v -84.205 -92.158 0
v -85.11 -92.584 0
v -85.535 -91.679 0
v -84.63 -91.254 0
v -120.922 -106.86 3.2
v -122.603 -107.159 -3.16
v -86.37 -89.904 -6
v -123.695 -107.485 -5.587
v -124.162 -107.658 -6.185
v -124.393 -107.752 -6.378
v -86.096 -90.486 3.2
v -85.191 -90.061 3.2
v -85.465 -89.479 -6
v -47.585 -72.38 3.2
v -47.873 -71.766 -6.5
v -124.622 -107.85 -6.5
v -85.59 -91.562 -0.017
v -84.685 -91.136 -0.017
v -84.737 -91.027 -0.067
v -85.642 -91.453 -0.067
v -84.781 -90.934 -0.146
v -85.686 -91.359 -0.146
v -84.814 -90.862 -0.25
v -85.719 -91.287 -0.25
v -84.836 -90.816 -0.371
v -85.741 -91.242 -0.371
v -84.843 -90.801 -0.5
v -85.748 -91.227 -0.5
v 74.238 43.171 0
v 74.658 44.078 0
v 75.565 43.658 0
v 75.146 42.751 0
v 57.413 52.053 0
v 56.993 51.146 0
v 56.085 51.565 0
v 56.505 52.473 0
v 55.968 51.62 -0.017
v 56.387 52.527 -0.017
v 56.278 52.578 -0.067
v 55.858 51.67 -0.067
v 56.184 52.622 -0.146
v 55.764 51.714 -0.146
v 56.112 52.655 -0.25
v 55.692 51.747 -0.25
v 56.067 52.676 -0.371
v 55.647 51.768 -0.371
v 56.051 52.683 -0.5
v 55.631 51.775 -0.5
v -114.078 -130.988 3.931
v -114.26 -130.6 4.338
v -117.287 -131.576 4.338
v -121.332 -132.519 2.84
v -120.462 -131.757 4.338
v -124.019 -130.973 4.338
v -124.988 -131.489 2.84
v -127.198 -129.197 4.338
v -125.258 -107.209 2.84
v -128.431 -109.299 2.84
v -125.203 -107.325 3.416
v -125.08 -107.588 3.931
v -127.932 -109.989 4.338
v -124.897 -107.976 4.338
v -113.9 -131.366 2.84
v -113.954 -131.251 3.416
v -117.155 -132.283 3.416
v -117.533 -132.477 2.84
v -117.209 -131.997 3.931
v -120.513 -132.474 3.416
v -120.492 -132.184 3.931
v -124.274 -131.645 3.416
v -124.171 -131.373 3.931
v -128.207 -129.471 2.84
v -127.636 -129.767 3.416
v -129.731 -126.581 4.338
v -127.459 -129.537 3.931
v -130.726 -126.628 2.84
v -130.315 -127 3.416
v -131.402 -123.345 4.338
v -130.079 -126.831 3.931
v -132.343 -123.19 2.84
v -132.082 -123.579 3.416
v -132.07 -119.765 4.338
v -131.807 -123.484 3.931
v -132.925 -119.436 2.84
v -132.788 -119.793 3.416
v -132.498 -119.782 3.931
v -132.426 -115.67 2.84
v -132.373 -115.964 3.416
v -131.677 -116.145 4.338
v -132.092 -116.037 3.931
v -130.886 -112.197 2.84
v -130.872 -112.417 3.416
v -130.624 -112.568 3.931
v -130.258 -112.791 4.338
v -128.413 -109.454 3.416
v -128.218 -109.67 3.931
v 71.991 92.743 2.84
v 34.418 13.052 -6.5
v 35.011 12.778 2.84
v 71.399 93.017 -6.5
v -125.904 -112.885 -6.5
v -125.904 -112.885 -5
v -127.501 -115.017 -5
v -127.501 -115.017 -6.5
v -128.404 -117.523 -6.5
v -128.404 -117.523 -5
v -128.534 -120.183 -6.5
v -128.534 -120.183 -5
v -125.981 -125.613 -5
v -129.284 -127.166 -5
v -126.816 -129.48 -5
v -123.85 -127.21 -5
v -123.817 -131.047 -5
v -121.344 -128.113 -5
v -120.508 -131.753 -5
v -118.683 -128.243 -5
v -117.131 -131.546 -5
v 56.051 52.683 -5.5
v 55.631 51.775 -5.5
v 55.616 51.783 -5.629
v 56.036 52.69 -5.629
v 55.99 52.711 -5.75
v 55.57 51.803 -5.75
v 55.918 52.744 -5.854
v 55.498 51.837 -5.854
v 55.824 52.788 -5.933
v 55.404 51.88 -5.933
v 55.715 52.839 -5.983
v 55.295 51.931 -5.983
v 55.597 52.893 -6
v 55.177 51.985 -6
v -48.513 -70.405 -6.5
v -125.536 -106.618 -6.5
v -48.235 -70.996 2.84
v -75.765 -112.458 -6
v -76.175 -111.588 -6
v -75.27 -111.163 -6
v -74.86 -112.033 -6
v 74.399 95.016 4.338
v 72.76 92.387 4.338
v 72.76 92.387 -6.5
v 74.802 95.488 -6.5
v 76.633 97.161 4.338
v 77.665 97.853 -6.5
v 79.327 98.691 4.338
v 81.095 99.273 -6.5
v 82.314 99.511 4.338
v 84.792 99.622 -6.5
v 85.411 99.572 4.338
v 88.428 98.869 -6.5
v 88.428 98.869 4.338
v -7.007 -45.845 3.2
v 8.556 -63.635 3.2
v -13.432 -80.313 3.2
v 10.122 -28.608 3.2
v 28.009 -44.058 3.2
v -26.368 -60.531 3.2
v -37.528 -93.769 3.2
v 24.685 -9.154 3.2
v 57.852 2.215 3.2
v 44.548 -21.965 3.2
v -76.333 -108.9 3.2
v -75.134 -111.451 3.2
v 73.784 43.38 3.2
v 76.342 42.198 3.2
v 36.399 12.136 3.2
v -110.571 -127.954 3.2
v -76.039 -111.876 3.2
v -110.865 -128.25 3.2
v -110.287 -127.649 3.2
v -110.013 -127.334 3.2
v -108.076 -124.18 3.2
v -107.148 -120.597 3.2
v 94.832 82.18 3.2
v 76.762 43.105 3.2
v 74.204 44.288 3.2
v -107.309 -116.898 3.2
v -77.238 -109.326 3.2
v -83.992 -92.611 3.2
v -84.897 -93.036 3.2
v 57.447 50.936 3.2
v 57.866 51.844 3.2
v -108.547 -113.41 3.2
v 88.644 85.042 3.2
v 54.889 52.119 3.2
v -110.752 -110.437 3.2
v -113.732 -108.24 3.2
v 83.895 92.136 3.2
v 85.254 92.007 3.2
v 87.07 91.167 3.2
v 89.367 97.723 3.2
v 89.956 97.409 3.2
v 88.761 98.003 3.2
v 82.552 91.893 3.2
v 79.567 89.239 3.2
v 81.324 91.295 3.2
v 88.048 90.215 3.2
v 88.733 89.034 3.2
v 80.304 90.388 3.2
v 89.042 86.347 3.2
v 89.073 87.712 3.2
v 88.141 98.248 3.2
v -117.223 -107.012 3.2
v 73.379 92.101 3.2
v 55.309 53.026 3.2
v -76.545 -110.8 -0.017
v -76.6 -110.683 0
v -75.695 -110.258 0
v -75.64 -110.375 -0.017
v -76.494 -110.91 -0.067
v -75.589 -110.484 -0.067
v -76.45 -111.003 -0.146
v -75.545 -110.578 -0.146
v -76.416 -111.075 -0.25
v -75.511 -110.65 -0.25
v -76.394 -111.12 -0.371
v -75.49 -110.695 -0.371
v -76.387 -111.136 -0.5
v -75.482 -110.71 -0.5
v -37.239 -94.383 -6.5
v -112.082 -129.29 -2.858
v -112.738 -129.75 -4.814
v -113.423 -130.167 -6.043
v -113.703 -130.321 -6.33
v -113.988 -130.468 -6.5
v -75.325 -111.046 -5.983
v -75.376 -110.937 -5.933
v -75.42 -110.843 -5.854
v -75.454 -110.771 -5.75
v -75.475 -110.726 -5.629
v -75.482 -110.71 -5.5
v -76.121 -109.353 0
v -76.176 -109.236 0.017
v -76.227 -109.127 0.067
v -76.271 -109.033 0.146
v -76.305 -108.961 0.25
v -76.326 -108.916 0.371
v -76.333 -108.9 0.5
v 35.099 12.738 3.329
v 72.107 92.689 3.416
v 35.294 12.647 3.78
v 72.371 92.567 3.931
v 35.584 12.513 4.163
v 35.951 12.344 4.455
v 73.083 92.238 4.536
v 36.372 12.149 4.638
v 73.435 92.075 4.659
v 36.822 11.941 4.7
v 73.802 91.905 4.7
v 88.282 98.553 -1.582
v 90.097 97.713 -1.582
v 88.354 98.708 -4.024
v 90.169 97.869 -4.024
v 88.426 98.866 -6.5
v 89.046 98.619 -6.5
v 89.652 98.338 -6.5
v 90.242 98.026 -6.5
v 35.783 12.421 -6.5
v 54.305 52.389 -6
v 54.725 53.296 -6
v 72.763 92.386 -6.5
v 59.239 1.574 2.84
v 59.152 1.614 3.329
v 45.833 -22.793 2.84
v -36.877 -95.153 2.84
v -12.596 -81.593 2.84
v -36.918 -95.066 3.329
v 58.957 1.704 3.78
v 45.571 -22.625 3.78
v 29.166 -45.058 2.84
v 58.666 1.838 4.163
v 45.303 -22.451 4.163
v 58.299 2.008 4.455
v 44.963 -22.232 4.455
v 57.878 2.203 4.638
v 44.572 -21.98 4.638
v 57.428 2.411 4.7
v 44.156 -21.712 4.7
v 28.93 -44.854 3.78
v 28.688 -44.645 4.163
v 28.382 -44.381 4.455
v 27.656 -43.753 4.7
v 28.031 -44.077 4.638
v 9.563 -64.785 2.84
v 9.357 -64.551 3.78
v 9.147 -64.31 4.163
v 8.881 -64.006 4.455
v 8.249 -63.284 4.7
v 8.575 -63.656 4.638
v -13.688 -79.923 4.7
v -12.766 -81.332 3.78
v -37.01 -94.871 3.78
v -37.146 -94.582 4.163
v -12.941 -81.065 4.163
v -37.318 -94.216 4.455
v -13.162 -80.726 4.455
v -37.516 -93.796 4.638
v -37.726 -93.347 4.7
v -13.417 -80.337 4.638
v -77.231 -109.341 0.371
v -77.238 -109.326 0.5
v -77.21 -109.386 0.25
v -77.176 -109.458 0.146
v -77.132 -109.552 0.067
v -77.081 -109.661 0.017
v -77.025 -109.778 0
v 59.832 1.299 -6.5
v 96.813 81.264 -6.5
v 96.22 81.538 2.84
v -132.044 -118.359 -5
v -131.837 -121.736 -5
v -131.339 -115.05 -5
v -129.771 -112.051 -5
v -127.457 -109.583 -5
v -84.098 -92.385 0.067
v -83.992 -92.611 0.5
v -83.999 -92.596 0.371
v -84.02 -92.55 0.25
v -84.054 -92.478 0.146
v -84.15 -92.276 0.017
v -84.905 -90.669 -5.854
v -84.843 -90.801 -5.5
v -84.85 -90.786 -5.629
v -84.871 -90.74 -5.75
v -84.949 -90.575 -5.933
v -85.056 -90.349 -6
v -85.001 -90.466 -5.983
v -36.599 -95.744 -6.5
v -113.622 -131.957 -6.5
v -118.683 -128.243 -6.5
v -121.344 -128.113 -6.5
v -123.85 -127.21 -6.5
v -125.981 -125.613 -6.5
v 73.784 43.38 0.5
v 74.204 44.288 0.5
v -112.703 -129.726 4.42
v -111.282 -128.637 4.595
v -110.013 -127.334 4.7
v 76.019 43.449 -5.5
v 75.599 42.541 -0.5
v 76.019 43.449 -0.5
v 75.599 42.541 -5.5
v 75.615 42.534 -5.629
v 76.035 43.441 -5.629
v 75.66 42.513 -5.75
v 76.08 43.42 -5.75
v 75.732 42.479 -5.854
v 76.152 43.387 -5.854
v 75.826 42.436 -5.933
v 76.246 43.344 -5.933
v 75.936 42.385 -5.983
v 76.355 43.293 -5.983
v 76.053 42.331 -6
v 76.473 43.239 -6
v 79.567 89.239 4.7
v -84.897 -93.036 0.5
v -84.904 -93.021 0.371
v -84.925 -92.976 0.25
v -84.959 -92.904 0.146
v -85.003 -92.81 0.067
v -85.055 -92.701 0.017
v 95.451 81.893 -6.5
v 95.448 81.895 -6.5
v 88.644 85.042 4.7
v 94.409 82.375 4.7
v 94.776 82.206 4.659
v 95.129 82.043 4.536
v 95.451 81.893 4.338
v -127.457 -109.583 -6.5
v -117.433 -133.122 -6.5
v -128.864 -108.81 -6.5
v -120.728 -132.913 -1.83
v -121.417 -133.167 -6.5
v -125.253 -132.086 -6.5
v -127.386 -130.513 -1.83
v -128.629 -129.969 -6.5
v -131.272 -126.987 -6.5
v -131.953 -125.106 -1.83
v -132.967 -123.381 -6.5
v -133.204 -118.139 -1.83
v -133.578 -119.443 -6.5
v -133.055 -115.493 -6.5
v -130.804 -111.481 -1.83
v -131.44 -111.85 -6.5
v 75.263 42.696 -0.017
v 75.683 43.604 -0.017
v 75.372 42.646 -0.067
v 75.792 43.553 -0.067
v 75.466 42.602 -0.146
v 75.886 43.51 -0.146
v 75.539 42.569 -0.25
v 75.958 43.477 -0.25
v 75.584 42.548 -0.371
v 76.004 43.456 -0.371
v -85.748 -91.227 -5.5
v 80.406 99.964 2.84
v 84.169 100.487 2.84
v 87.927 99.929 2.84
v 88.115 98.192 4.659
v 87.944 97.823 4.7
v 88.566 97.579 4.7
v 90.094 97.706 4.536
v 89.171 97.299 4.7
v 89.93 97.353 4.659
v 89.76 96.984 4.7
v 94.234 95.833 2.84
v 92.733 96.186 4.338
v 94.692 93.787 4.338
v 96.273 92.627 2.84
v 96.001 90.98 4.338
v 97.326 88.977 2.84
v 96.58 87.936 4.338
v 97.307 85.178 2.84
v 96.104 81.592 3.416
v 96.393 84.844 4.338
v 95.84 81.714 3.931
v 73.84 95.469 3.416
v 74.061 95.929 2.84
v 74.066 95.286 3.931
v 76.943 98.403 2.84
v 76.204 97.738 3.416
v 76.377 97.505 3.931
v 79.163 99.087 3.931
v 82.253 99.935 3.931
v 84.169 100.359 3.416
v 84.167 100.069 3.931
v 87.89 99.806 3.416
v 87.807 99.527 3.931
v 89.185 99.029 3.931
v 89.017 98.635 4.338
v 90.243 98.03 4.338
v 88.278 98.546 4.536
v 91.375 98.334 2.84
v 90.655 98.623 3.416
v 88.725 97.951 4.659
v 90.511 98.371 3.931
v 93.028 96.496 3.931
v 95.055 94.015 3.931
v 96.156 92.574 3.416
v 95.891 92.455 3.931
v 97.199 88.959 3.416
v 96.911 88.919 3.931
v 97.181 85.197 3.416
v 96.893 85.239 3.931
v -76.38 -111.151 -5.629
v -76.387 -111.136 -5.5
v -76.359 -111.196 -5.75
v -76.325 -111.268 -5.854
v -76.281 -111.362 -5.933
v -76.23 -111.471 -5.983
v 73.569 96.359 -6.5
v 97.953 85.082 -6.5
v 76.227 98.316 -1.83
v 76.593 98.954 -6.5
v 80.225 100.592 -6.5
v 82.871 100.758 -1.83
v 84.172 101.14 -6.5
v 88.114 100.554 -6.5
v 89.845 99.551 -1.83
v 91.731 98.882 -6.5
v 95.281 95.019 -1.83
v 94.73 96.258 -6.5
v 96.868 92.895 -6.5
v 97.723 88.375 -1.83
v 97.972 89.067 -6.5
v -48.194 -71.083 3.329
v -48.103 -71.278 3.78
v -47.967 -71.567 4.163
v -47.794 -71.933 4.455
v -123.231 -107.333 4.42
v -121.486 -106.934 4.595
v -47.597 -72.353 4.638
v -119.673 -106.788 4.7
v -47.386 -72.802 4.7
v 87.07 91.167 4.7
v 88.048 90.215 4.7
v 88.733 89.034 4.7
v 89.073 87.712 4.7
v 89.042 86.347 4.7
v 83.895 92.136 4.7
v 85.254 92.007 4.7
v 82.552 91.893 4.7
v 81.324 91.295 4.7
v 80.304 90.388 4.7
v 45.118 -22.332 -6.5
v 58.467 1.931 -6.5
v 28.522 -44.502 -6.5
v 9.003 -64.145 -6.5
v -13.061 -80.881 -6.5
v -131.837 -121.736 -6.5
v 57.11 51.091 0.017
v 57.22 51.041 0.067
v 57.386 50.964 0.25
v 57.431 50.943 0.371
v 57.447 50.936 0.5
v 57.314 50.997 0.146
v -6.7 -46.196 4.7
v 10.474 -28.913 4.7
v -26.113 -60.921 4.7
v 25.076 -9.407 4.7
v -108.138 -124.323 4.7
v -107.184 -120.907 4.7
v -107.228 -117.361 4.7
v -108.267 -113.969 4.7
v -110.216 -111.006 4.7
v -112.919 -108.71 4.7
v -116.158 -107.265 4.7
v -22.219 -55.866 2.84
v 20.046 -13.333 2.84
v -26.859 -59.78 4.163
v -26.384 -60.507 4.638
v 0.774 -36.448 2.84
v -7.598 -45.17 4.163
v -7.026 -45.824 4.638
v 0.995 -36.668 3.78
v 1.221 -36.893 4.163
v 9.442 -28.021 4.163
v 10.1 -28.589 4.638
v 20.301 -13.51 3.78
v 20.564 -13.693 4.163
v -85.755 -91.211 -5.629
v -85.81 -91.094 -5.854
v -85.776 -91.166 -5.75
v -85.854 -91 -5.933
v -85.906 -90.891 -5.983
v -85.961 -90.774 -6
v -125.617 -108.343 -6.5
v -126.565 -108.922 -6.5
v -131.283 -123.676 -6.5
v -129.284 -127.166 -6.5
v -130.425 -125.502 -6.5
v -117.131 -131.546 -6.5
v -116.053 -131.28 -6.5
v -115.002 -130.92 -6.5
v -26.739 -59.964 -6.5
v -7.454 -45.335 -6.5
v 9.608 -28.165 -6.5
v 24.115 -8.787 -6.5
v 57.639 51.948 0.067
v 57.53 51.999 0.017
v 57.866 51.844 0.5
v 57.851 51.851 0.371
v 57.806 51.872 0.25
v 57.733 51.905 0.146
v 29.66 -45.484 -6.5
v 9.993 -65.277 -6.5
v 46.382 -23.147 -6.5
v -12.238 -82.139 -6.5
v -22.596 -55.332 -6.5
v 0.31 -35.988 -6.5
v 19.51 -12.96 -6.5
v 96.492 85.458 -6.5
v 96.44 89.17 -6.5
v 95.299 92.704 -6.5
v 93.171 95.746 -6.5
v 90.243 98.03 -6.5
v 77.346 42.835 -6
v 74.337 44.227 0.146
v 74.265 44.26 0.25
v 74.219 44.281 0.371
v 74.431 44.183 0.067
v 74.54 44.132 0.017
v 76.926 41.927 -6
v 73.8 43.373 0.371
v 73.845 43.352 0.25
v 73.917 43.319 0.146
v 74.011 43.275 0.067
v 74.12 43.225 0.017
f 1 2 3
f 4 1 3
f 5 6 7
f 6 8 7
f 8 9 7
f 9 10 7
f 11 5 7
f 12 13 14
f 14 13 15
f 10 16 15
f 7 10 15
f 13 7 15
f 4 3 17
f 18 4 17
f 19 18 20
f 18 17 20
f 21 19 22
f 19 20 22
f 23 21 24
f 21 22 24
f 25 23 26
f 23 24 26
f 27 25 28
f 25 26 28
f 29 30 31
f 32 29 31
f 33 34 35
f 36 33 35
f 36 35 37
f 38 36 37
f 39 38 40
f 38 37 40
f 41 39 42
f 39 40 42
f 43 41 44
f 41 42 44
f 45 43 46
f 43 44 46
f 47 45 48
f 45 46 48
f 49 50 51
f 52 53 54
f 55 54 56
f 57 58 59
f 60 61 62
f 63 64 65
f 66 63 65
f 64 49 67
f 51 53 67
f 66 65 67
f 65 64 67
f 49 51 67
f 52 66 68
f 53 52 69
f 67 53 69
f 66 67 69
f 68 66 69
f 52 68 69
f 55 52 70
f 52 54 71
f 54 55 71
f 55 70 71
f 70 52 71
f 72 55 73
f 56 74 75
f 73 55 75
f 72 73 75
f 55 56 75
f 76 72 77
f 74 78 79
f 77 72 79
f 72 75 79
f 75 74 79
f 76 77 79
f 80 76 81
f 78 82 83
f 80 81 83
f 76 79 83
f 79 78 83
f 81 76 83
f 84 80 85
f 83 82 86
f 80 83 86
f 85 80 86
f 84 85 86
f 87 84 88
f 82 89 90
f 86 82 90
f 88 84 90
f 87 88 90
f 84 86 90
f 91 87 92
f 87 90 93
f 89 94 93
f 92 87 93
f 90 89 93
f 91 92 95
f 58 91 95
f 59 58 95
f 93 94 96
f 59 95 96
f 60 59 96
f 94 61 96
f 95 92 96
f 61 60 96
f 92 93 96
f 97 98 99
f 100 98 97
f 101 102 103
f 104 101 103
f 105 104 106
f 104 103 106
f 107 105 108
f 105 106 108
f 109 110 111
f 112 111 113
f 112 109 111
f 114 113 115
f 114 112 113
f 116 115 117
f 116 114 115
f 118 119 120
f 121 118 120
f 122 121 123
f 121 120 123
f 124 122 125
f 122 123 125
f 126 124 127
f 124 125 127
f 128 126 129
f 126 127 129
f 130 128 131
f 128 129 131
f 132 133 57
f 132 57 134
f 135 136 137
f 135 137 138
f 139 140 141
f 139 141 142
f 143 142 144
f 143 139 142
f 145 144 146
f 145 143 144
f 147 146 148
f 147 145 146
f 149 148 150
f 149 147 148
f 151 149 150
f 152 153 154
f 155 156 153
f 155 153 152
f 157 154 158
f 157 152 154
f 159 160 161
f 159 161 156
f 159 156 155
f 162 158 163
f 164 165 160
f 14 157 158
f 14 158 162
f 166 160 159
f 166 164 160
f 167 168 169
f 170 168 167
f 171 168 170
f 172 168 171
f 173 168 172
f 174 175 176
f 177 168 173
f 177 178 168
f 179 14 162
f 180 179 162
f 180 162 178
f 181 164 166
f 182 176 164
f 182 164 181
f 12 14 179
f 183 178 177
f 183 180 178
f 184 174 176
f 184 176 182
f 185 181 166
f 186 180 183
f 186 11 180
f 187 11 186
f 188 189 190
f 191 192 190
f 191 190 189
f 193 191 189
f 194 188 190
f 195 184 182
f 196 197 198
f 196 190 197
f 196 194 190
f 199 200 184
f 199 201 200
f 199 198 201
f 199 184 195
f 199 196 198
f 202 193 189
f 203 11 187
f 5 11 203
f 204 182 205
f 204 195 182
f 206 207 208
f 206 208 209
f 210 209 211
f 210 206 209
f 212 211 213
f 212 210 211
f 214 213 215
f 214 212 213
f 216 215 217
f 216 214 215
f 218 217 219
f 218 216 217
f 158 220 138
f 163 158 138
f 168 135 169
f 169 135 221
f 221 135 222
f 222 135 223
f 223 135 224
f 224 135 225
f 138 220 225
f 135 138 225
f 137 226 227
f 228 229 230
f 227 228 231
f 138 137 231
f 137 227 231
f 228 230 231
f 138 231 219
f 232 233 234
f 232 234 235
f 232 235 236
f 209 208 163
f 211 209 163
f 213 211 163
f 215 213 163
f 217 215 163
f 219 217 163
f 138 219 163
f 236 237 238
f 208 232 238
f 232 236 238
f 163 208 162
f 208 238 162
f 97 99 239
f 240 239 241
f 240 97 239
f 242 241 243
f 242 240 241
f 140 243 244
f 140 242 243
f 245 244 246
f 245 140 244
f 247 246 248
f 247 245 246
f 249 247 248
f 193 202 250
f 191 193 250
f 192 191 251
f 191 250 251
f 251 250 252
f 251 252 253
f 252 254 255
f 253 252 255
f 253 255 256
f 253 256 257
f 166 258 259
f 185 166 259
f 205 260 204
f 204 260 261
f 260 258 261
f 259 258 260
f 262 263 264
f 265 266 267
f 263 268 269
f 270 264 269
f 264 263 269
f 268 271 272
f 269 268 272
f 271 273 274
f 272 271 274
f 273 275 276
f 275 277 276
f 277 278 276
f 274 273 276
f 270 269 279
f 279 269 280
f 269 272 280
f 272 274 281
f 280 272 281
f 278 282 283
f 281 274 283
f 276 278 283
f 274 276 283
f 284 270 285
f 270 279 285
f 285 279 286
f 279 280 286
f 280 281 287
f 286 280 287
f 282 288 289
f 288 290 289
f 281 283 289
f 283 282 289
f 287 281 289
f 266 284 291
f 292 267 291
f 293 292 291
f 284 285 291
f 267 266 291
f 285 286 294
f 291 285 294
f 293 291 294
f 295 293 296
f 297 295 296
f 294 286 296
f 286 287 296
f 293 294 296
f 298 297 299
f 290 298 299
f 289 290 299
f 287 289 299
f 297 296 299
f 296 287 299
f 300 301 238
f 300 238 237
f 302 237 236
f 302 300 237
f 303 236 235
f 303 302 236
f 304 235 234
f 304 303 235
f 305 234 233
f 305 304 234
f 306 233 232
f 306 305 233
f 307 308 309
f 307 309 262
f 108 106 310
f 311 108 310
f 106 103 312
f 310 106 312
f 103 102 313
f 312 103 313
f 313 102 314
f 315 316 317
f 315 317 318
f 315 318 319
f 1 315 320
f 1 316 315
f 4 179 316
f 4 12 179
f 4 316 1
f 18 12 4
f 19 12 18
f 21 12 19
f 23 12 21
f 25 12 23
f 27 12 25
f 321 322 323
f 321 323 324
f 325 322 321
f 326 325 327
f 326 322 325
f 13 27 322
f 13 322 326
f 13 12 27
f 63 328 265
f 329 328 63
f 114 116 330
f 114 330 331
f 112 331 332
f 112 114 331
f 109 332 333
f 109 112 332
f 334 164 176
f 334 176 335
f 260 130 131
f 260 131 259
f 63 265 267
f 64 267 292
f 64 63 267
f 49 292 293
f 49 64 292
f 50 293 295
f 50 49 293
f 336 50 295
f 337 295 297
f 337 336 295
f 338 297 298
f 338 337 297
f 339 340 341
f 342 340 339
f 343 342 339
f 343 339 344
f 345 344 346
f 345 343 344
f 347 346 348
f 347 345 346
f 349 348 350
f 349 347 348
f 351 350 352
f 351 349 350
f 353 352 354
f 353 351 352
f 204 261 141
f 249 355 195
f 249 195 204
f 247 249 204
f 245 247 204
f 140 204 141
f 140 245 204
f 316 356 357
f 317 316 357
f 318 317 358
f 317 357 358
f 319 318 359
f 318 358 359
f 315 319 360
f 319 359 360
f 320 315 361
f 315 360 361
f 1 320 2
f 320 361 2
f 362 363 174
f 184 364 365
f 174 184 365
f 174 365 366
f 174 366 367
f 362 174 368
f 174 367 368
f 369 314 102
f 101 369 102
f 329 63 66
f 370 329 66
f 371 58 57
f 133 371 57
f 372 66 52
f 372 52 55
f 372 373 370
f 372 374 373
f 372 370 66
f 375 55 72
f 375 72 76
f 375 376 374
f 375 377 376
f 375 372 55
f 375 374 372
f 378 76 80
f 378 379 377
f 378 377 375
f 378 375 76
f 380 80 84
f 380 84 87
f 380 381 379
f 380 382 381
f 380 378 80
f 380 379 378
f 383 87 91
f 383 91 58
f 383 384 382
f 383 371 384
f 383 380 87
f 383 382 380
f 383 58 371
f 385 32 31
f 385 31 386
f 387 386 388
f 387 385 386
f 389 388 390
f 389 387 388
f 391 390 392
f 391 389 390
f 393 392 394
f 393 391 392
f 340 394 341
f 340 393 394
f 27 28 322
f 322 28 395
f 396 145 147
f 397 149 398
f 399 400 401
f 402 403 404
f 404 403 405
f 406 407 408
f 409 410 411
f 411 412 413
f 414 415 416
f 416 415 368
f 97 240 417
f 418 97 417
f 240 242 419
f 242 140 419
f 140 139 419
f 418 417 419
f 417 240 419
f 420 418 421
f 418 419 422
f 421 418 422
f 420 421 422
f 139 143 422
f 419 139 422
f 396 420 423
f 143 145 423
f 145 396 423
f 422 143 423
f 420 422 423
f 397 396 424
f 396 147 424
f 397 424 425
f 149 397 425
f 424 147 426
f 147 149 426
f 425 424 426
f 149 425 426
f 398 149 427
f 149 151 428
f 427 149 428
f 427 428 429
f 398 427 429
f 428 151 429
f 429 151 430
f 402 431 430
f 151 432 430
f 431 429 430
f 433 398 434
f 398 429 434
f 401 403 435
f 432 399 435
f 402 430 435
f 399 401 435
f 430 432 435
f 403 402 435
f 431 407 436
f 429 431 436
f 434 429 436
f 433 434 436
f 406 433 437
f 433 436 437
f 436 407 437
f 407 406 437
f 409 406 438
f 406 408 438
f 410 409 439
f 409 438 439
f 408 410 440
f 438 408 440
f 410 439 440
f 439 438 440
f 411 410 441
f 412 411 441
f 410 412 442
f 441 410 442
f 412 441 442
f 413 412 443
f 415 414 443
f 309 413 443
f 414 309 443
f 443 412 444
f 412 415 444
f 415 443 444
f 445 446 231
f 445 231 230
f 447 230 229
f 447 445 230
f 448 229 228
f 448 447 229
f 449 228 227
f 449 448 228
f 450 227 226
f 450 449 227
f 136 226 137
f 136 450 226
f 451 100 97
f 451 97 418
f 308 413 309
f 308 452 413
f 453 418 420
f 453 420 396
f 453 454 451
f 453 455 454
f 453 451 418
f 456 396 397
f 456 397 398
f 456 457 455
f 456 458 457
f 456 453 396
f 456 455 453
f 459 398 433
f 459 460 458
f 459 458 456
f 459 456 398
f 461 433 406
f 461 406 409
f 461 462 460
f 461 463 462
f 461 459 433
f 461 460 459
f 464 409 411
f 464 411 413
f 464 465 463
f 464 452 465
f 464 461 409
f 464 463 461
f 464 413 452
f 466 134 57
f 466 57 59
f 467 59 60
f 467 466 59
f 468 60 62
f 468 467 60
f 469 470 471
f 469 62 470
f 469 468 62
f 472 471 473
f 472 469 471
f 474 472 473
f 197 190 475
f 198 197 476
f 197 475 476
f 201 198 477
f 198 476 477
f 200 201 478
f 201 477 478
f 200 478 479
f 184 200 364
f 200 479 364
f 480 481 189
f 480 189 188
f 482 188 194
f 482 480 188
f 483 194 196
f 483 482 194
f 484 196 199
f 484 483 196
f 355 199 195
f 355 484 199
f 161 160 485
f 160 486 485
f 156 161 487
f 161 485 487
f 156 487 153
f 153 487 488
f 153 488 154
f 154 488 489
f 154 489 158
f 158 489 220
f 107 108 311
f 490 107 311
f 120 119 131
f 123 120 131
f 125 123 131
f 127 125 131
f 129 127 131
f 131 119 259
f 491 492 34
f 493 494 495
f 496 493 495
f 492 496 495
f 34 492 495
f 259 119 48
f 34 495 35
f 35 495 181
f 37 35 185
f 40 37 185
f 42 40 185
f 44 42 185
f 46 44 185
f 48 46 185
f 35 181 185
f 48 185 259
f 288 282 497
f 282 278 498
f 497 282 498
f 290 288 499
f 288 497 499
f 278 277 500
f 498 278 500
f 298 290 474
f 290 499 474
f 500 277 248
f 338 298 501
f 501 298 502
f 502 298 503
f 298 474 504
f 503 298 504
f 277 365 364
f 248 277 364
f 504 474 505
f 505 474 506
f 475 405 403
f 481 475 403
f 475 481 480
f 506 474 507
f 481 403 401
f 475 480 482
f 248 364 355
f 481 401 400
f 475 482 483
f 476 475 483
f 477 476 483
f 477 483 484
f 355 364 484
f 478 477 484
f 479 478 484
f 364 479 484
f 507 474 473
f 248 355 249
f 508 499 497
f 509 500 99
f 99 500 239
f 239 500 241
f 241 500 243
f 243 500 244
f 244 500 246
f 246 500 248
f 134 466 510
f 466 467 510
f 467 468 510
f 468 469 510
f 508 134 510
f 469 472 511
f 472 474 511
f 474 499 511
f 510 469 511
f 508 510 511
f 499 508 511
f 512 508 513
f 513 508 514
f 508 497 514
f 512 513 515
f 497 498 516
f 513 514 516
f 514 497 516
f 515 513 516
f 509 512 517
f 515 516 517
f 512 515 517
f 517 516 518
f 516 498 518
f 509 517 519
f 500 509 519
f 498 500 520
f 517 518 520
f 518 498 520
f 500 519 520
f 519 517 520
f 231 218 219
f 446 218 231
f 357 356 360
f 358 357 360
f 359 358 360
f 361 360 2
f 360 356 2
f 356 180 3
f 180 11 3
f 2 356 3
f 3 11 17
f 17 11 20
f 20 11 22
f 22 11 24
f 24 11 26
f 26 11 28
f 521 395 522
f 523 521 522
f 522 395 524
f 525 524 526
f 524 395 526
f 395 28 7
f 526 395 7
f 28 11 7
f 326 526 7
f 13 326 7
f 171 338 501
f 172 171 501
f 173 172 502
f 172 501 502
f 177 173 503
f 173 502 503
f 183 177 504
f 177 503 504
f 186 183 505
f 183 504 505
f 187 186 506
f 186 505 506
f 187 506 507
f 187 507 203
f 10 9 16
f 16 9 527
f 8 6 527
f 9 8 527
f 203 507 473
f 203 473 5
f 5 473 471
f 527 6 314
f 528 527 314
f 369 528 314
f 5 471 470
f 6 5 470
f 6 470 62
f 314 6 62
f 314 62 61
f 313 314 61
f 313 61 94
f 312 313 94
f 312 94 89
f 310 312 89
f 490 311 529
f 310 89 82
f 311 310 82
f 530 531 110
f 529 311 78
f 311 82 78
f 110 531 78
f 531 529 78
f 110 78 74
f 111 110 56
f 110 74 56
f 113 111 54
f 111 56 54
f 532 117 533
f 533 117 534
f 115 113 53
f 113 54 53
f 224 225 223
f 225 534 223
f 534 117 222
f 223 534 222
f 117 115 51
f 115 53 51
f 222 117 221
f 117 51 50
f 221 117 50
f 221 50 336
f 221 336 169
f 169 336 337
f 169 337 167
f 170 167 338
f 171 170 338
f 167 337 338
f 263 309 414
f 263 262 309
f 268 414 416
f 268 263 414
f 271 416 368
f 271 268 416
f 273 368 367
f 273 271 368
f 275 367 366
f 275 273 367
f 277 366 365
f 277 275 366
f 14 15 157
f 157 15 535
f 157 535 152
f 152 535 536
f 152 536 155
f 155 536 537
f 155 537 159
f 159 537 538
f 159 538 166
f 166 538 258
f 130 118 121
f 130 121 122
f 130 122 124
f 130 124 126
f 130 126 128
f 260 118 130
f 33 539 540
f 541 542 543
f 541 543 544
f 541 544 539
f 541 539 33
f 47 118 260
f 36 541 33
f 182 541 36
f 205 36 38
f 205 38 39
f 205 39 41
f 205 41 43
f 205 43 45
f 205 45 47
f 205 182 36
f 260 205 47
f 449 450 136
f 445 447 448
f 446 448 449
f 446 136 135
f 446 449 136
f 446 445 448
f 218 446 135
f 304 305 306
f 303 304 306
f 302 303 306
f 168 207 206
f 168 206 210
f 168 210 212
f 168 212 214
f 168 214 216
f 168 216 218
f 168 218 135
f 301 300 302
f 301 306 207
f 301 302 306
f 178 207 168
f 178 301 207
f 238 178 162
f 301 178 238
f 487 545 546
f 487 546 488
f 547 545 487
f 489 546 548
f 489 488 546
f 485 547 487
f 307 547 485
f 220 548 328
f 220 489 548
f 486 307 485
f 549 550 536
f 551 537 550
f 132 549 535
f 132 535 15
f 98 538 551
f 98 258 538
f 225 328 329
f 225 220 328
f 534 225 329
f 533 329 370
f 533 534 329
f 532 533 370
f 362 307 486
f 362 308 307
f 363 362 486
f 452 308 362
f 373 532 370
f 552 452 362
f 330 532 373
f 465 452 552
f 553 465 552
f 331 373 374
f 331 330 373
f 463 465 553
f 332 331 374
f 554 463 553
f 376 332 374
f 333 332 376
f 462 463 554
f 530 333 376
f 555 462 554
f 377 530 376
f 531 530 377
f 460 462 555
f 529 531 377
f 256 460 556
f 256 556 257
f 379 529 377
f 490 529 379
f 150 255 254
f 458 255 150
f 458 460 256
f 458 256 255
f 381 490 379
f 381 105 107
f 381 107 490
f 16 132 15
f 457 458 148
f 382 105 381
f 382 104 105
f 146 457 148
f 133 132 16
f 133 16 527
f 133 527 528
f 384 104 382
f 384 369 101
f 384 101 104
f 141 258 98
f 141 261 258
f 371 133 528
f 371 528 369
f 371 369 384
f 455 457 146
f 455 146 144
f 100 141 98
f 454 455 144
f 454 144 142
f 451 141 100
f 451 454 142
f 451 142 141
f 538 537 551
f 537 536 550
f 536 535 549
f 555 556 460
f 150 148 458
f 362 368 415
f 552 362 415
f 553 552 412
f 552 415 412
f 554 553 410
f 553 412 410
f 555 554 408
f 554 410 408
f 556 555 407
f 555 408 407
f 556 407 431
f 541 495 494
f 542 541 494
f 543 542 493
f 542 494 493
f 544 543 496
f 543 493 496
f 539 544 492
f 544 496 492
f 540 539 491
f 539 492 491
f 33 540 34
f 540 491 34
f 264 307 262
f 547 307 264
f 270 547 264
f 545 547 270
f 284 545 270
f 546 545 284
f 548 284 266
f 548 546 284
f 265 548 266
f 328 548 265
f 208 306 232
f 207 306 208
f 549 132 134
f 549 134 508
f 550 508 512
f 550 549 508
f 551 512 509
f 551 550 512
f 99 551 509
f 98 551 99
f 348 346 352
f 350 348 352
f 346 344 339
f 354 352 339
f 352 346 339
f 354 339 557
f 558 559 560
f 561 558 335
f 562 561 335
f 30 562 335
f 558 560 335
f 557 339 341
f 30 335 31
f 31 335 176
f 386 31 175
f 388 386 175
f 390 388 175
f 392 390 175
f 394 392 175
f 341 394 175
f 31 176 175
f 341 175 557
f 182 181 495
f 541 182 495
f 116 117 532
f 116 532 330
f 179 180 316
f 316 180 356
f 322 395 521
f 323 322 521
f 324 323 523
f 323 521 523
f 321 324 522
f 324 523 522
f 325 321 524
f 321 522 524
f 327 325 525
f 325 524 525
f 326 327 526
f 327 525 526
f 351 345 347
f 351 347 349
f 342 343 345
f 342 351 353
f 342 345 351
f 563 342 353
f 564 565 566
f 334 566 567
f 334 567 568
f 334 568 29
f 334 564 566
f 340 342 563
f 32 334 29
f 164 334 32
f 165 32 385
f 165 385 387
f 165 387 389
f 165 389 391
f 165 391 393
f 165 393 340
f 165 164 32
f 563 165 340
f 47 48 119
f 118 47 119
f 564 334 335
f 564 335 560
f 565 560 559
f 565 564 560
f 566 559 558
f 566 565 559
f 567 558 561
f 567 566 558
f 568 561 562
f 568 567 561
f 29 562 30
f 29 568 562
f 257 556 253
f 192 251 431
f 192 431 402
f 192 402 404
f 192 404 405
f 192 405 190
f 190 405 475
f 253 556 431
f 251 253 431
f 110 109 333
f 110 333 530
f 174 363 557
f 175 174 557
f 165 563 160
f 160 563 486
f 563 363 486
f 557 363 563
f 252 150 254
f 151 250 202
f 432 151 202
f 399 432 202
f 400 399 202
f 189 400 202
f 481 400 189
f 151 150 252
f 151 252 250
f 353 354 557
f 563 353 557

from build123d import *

# Parameters (mm, degrees)
EXTRUSION2_DEPTH        = 11.2
EXTRUSION2_DRAFT        = -4
COQUE1_T                = -1.5
CONG_1_R                = 2
ESQUISSE4_R             = 12.5
ENL_V_MAT_EXTRU_1_DEPTH = 190.035497549
EXTRUSION3_START        = -1.5
EXTRUSION3_DEPTH        = 1.5
EXTRUSION4_DEPTH        = 1
EXTRUSION5_DEPTH        = 1


with BuildPart() as part:
    # Esquisse3 → Extrusion2 (with draft: the straight prism first)
    with BuildSketch(Plane(origin=(0, 0, -6.5), x_dir=(-1, 0, 0), z_dir=(0, 0, -1))):
        with BuildLine():
            Line((-34.418091678, 13.052373199), (-71.398662192, 93.016853596))
            ThreePointArc((-71.398662192, 93.016853596), (-89.98211464, 99.847321744), (-96.812582788, 81.263869296))
            Line((-96.812582788, 81.263869296), (-59.832012274, 1.299388899))
            ThreePointArc((-59.832012274, 1.299388899), (-20.171981407, -55.724047413), (36.599420799, -95.744020285))
            Line((36.599420799, -95.744020285), (113.622178214, -131.957364461))
            ThreePointArc((113.622178214, -131.957364461), (132.248468989, -125.244593651), (125.535698179, -106.618302875))
            Line((125.535698179, -106.618302875), (48.512940764, -70.4049587))
            ThreePointArc((48.512940764, -70.4049587), (-0.310465133, -35.987782029), (-34.418091678, 13.052373199))
        make_face()
    extrude(amount=-EXTRUSION2_DEPTH)
    # Extrusion2: the draft: its side faces are tilted about the plane it starts from
    extrusion2_sides = [part.faces().sort_by_distance(p)[0] for p in [
        (52.908376935, 53.034613397, -0.9),
        (89.98211464, 99.847321744, -0.9),
        (78.322297531, 41.281629097, -0.9),
        (20.171981407, -55.724047413, -0.9),
        (-75.110799506, -113.850692373, -0.9),
        (-132.248468989, -125.244593651, -0.9),
        (-87.024319472, -88.511630788, -0.9),
        (0.310465133, -35.987782029, -0.9),
    ]]
    draft(extrusion2_sides, Plane(origin=(0, 0, -6.5), x_dir=(-1, 0, 0), z_dir=(0, 0, -1)), EXTRUSION2_DRAFT)

    # Coque1
    coque1_openings = [part.faces().sort_by_distance(p)[0] for p in [
        (55.899933032, 51.651130998, -6.5),
    ]]
    offset(amount=COQUE1_T, openings=coque1_openings, kind=Kind.INTERSECTION)

    # Congé1
    cong_1_edges = [part.edges().sort_by_distance(p)[0] for p in [
        (89.653375151, 99.136475965, 4.7),
        (77.611451752, 41.610368587, 4.7),
        (19.616440402, -55.172009765, 4.7),
        (-75.444029294, -113.141940455, 4.7),
        (-131.539717071, -124.911363863, 4.7),
        (-86.691089684, -89.220382705, 4.7),
        (0.866006138, -36.539819677, 4.7),
        (53.619222714, 52.705873908, 4.7),
    ]]
    fillet(cong_1_edges, radius=CONG_1_R)

    # Esquisse4 → Enlèv. mat.-Extru.1 (cut, through all)
    with BuildSketch(Plane.XY.offset(4.7)):
        with Locations(Location((-119.578938197, -119.287833668, 0), (0, 0, 319.931231963))):
            Circle(ESQUISSE4_R)
        with BuildLine():
            Line((88.428033532, 98.869247275), (85.254326361, 92.00662073))
            ThreePointArc((85.254326361, 92.00662073), (81.917712078, 91.636253796), (79.567422384, 89.239108642))
            Line((79.567422384, 89.239108642), (72.760122224, 92.387229437))
            ThreePointArc((72.760122224, 92.387229437), (79.327015541, 98.690898906), (88.428033532, 98.869247275))
        make_face()
        with BuildLine():
            Line((90.243313574, 98.029748396), (87.069606403, 91.167121851))
            ThreePointArc((87.069606403, 91.167121851), (88.948261451, 88.384888621), (88.643822596, 85.041614249))
            Line((88.643822596, 85.041614249), (95.451122756, 81.893493455))
            ThreePointArc((95.451122756, 81.893493455), (96.001427458, 90.979609311), (90.243313574, 98.029748396))
        make_face()
    extrude(amount=-ENL_V_MAT_EXTRU_1_DEPTH, mode=Mode.SUBTRACT)

    # Esquisse5 → Extrusion3 (add)
    with BuildSketch(Plane(origin=(0, 0, -6.5), x_dir=(-1, 0, 0), z_dir=(0, 0, -1)).offset(EXTRUSION3_START)):
        with BuildLine():
            Line((127.456927912, -109.582820632), (125.904179404, -112.885386975))
            ThreePointArc((125.904179404, -112.885386975), (128.045865957, -116.236418537), (128.534282025, -120.183275965))
            Line((128.534282025, -120.183275965), (131.836848368, -121.736024473))
            ThreePointArc((131.836848368, -121.736024473), (131.338560086, -115.049757096), (127.456927912, -109.582820632))
        make_face()
        with BuildLine():
            Line((125.98138489, -125.613074876), (129.283951233, -127.165823384))
            ThreePointArc((129.283951233, -127.165823384), (123.817014768, -131.047455557), (117.130747392, -131.54574384))
            Line((117.130747392, -131.54574384), (118.6834959, -128.243177497))
            ThreePointArc((118.6834959, -128.243177497), (122.630353328, -127.754761428), (125.98138489, -125.613074876))
        make_face()
    extrude(amount=EXTRUSION3_DEPTH)

    # Esquisse6 → Extrusion4 (add)
    with BuildSketch(Plane(origin=(-86.746444122, -89.10264844, 2.839512947), x_dir=(0, 0, -1), z_dir=(0.9049664851912623, 0.42548285591851137, 0))):
        with BuildLine():
            Line((-0.360487053, -4.346917634), (2.339512947, -4.346917634))
            ThreePointArc((2.339512947, -4.346917634), (2.693066338, -4.200471025), (2.839512947, -3.846917634))
            Line((2.839512947, -3.846917634), (2.839512947, -2.846917634))
            ThreePointArc((2.839512947, -2.846917634), (2.985959557, -2.493364244), (3.339512947, -2.346917634))
            Line((3.339512947, -2.346917634), (8.339512947, -2.346917634))
            ThreePointArc((8.339512947, -2.346917634), (8.693066338, -2.200471025), (8.839512947, -1.846917634))
            Line((8.839512947, -1.846917634), (8.839512947, -0.885543888))
            Line((8.839512947, -0.885543888), (-0.360487053, -1.528870557))
            Line((-0.360487053, -1.528870557), (-0.360487053, -4.346917634))
        make_face()
        with BuildLine():
            Line((-0.360487053, -22.346917634), (2.339512947, -22.346917634))
            ThreePointArc((2.339512947, -22.346917634), (2.693066338, -22.493364244), (2.839512947, -22.846917634))
            Line((2.839512947, -22.846917634), (2.839512947, -23.846917634))
            ThreePointArc((2.839512947, -23.846917634), (2.985959557, -24.200471025), (3.339512947, -24.346917634))
            Line((3.339512947, -24.346917634), (8.339512947, -24.346917634))
            ThreePointArc((8.339512947, -24.346917634), (8.693066338, -24.493364244), (8.839512947, -24.846917634))
            Line((8.839512947, -24.846917634), (8.839512947, -25.808291381))
            Line((8.839512947, -25.808291381), (-0.360487053, -25.164964712))
            Line((-0.360487053, -25.164964712), (-0.360487053, -22.346917634))
        make_face()
    extrude(amount=EXTRUSION4_DEPTH)

    # Esquisse7 → Extrusion5 (add)
    with BuildSketch(Plane(origin=(52.908376935, 53.034613397, -6.5), x_dir=(-0.9076400212812858, 0.4197494392712243, 0), z_dir=(0.4197494392712243, 0.9076400212812858, 0))):
        with BuildLine():
            Line((-23, 9.7), (-23, 7))
            ThreePointArc((-23, 7), (-23.146446609, 6.646446609), (-23.5, 6.5))
            Line((-23.5, 6.5), (-24.5, 6.5))
            ThreePointArc((-24.5, 6.5), (-24.853553391, 6.353553391), (-25, 6))
            Line((-25, 6), (-25, 1))
            ThreePointArc((-25, 1), (-25.146446609, 0.646446609), (-25.5, 0.5))
            Line((-25.5, 0.5), (-26.461373747, 0.5))
            Line((-26.461373747, 0.5), (-25.818047077, 9.7))
            Line((-25.818047077, 9.7), (-23, 9.7))
        make_face()
        with BuildLine():
            Line((-5, 9.7), (-5, 7))
            ThreePointArc((-5, 7), (-4.853553391, 6.646446609), (-4.5, 6.5))
            Line((-4.5, 6.5), (-3.5, 6.5))
            ThreePointArc((-3.5, 6.5), (-3.146446609, 6.353553391), (-3, 6))
            Line((-3, 6), (-3, 1))
            ThreePointArc((-3, 1), (-2.853553391, 0.646446609), (-2.5, 0.5))
            Line((-2.5, 0.5), (-1.538626253, 0.5))
            Line((-1.538626253, 0.5), (-2.181952923, 9.7))
            Line((-2.181952923, 9.7), (-5, 9.7))
        make_face()
    extrude(amount=EXTRUSION5_DEPTH)


solid = part.part
